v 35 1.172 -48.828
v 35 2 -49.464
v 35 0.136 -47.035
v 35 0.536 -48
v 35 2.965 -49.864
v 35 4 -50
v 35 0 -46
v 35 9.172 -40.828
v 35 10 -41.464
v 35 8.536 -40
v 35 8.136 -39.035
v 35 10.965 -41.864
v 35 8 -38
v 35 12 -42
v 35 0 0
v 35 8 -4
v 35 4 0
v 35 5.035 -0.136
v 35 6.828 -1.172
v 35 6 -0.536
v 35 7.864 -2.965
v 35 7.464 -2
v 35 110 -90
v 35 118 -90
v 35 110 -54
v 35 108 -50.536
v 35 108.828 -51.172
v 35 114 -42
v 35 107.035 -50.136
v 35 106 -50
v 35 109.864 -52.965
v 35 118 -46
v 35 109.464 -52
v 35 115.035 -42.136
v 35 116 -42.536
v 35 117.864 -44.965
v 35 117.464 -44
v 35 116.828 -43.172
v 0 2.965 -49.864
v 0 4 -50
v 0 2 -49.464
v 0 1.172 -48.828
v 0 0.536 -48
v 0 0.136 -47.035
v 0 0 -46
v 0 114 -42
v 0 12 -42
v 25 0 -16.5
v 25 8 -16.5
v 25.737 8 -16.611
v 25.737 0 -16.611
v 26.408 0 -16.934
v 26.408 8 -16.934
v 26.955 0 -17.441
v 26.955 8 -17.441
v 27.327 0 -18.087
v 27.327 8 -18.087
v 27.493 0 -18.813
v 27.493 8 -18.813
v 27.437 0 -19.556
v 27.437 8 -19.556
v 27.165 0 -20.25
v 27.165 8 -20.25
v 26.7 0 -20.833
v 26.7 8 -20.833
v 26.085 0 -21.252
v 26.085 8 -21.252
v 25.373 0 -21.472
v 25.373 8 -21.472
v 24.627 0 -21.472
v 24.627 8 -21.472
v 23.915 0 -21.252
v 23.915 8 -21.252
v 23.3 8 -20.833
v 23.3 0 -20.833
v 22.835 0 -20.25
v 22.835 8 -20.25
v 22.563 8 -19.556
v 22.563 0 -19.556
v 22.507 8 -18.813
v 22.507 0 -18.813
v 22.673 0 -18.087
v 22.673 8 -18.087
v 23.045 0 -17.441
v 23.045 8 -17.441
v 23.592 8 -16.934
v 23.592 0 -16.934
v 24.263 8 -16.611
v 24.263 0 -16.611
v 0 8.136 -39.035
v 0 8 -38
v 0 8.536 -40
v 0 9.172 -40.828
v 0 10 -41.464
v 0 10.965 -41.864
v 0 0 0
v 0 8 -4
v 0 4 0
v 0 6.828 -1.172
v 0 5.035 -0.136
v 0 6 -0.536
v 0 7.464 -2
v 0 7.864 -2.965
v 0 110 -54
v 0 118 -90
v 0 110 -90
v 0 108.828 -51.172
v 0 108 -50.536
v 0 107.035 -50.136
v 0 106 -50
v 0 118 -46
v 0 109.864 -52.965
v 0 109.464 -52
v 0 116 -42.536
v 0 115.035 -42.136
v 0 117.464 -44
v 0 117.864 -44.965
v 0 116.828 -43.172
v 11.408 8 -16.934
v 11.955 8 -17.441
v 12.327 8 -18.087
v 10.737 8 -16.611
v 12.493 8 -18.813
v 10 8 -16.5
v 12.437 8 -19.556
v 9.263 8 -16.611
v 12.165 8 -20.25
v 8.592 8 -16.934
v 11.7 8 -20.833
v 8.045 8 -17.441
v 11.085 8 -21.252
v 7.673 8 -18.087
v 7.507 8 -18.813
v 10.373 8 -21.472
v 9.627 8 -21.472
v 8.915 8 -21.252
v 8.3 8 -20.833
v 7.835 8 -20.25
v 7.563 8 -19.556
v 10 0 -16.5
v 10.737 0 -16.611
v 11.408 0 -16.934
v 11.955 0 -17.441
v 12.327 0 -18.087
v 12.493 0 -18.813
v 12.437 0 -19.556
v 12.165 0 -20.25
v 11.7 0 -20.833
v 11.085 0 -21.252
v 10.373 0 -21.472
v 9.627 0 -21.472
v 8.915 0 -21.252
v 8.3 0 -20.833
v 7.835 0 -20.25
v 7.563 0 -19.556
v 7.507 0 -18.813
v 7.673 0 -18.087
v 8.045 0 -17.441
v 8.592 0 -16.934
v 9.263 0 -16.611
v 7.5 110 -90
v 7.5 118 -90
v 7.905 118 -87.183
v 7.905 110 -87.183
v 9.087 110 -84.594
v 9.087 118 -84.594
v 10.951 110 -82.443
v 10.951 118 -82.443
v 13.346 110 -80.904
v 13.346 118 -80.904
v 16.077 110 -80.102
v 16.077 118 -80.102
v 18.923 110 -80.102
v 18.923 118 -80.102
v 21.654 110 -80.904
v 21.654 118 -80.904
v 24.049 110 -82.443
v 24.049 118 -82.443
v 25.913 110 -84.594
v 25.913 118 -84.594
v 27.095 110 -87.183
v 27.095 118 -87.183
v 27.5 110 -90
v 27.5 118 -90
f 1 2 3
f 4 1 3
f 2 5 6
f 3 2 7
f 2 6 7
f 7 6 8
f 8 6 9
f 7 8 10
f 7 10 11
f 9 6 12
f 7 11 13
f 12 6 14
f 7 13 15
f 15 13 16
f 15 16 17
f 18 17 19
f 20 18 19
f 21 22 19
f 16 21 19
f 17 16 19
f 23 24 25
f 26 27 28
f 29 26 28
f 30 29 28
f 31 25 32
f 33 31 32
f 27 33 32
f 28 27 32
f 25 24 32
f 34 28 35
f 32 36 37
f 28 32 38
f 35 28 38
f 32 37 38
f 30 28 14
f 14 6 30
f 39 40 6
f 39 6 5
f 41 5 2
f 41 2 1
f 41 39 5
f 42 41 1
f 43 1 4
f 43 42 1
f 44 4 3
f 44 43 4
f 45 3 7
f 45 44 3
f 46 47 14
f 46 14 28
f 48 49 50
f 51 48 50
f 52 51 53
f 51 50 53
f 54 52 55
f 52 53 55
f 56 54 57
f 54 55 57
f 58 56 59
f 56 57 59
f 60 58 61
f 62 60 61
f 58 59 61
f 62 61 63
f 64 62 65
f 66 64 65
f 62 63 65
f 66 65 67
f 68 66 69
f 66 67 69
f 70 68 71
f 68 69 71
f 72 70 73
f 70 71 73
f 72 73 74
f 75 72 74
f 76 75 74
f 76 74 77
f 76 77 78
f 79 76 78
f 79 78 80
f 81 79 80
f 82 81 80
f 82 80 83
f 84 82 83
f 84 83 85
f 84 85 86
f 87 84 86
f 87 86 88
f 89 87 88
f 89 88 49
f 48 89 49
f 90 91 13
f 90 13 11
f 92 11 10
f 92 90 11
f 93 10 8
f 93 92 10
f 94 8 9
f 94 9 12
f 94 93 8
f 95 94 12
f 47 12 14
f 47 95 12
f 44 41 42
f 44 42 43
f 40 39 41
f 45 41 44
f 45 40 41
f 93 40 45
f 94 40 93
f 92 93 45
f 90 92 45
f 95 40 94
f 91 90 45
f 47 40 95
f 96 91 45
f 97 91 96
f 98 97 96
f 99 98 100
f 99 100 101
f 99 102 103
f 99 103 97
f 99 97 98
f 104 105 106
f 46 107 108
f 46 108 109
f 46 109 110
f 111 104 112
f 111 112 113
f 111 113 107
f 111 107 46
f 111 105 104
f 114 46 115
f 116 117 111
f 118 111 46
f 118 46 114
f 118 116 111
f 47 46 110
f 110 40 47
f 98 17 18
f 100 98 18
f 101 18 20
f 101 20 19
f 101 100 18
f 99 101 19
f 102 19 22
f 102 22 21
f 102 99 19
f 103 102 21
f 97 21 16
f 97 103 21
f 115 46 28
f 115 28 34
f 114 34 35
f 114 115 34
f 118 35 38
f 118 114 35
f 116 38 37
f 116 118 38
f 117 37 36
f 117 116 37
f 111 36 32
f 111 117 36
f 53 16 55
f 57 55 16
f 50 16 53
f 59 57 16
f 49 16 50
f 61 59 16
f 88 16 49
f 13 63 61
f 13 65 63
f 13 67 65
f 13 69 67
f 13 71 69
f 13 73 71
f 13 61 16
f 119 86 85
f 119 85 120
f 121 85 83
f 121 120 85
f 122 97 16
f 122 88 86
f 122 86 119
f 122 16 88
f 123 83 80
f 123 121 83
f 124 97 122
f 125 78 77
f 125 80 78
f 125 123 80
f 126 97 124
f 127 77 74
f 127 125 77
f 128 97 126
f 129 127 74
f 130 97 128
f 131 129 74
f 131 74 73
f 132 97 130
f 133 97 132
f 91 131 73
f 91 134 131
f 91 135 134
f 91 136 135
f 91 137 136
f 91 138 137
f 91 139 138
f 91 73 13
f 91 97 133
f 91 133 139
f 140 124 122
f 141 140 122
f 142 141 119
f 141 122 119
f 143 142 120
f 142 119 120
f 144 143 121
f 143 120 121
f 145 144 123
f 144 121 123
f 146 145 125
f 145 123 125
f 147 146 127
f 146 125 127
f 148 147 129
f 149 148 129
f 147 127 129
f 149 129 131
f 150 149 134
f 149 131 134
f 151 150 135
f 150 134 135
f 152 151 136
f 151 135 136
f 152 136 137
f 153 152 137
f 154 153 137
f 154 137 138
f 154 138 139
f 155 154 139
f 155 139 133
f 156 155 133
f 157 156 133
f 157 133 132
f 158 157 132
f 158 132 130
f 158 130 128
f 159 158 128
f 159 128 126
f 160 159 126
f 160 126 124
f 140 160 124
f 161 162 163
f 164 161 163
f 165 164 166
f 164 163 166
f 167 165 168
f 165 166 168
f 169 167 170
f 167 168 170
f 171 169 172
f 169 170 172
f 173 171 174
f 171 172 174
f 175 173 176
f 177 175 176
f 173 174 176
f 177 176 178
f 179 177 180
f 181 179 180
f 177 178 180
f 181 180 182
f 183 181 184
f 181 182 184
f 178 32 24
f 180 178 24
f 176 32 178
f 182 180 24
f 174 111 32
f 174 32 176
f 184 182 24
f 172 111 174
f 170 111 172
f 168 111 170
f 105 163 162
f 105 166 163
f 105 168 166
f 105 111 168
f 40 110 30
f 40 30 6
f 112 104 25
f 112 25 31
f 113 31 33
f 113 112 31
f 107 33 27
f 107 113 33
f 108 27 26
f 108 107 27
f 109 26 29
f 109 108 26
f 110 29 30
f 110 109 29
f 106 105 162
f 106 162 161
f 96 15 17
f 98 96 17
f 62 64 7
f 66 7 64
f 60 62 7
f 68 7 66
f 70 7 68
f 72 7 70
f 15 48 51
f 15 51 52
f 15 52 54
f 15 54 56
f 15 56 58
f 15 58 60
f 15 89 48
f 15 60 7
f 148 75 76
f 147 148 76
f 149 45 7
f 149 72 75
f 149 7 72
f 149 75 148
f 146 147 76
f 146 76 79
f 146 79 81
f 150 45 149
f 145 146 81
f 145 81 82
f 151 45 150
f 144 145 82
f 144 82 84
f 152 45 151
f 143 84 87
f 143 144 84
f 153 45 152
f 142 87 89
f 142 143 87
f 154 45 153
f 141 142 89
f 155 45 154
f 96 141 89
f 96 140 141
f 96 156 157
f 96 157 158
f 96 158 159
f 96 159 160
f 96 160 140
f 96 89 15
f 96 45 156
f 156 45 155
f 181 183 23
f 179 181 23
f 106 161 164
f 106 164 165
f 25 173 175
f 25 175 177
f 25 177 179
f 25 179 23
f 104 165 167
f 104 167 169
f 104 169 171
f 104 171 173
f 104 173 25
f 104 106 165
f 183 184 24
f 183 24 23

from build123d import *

# Parameters (mm, degrees)
BOSS_EXTRUDE1_DEPTH = 35
SKETCH2_R           = 10
CUT_EXTRUDE1_DEPTH  = 10
SKETCH3_R           = 2.5
CUT_EXTRUDE2_DEPTH  = 147.372811683


with BuildPart() as part:
    # Sketch1 → Boss-Extrude1 (new body)
    with BuildSketch(Plane(origin=(0, 0, 0), x_dir=(0, 0, -1), z_dir=(1, 0, 0))):
        with BuildLine():
            Line((0, 0), (0, 4))
            ThreePointArc((0, 4), (1.171572875, 6.828427125), (4, 8))
            Line((4, 8), (38, 8))
            ThreePointArc((38, 8), (40.828427125, 9.171572875), (42, 12))
            Line((42, 12), (42, 114))
            ThreePointArc((42, 114), (43.171572875, 116.828427125), (46, 118))
            Line((46, 118), (90, 118))
            Line((90, 118), (90, 110))
            Line((90, 110), (54, 110))
            ThreePointArc((54, 110), (51.171572875, 108.828427125), (50, 106))
            Line((50, 106), (50, 4))
            ThreePointArc((50, 4), (48.828427125, 1.171572875), (46, 0))
            Line((46, 0), (0, 0))
        make_face()
    extrude(amount=BOSS_EXTRUDE1_DEPTH)

    # Sketch2 → Cut-Extrude1 (cut)
    with BuildSketch(Plane(origin=(0, 118, 0), x_dir=(1, 0, 0), z_dir=(0, 1, 0))):
        with Locations((17.5, 90)):
            Circle(SKETCH2_R)
    extrude(amount=-CUT_EXTRUDE1_DEPTH, mode=Mode.SUBTRACT)

    # Sketch3 → Cut-Extrude2 (cut, through all)
    with BuildSketch(Plane(origin=(0, 8, 0), x_dir=(1, 0, 0), z_dir=(0, 1, 0))):
        with Locations(Location((10, 19, 0), (0, 0, 270))):
            Circle(SKETCH3_R)
        with Locations(Location((25, 19, 0), (0, 0, 270))):
            Circle(SKETCH3_R)
    extrude(amount=-CUT_EXTRUDE2_DEPTH, mode=Mode.SUBTRACT)


solid = part.part
